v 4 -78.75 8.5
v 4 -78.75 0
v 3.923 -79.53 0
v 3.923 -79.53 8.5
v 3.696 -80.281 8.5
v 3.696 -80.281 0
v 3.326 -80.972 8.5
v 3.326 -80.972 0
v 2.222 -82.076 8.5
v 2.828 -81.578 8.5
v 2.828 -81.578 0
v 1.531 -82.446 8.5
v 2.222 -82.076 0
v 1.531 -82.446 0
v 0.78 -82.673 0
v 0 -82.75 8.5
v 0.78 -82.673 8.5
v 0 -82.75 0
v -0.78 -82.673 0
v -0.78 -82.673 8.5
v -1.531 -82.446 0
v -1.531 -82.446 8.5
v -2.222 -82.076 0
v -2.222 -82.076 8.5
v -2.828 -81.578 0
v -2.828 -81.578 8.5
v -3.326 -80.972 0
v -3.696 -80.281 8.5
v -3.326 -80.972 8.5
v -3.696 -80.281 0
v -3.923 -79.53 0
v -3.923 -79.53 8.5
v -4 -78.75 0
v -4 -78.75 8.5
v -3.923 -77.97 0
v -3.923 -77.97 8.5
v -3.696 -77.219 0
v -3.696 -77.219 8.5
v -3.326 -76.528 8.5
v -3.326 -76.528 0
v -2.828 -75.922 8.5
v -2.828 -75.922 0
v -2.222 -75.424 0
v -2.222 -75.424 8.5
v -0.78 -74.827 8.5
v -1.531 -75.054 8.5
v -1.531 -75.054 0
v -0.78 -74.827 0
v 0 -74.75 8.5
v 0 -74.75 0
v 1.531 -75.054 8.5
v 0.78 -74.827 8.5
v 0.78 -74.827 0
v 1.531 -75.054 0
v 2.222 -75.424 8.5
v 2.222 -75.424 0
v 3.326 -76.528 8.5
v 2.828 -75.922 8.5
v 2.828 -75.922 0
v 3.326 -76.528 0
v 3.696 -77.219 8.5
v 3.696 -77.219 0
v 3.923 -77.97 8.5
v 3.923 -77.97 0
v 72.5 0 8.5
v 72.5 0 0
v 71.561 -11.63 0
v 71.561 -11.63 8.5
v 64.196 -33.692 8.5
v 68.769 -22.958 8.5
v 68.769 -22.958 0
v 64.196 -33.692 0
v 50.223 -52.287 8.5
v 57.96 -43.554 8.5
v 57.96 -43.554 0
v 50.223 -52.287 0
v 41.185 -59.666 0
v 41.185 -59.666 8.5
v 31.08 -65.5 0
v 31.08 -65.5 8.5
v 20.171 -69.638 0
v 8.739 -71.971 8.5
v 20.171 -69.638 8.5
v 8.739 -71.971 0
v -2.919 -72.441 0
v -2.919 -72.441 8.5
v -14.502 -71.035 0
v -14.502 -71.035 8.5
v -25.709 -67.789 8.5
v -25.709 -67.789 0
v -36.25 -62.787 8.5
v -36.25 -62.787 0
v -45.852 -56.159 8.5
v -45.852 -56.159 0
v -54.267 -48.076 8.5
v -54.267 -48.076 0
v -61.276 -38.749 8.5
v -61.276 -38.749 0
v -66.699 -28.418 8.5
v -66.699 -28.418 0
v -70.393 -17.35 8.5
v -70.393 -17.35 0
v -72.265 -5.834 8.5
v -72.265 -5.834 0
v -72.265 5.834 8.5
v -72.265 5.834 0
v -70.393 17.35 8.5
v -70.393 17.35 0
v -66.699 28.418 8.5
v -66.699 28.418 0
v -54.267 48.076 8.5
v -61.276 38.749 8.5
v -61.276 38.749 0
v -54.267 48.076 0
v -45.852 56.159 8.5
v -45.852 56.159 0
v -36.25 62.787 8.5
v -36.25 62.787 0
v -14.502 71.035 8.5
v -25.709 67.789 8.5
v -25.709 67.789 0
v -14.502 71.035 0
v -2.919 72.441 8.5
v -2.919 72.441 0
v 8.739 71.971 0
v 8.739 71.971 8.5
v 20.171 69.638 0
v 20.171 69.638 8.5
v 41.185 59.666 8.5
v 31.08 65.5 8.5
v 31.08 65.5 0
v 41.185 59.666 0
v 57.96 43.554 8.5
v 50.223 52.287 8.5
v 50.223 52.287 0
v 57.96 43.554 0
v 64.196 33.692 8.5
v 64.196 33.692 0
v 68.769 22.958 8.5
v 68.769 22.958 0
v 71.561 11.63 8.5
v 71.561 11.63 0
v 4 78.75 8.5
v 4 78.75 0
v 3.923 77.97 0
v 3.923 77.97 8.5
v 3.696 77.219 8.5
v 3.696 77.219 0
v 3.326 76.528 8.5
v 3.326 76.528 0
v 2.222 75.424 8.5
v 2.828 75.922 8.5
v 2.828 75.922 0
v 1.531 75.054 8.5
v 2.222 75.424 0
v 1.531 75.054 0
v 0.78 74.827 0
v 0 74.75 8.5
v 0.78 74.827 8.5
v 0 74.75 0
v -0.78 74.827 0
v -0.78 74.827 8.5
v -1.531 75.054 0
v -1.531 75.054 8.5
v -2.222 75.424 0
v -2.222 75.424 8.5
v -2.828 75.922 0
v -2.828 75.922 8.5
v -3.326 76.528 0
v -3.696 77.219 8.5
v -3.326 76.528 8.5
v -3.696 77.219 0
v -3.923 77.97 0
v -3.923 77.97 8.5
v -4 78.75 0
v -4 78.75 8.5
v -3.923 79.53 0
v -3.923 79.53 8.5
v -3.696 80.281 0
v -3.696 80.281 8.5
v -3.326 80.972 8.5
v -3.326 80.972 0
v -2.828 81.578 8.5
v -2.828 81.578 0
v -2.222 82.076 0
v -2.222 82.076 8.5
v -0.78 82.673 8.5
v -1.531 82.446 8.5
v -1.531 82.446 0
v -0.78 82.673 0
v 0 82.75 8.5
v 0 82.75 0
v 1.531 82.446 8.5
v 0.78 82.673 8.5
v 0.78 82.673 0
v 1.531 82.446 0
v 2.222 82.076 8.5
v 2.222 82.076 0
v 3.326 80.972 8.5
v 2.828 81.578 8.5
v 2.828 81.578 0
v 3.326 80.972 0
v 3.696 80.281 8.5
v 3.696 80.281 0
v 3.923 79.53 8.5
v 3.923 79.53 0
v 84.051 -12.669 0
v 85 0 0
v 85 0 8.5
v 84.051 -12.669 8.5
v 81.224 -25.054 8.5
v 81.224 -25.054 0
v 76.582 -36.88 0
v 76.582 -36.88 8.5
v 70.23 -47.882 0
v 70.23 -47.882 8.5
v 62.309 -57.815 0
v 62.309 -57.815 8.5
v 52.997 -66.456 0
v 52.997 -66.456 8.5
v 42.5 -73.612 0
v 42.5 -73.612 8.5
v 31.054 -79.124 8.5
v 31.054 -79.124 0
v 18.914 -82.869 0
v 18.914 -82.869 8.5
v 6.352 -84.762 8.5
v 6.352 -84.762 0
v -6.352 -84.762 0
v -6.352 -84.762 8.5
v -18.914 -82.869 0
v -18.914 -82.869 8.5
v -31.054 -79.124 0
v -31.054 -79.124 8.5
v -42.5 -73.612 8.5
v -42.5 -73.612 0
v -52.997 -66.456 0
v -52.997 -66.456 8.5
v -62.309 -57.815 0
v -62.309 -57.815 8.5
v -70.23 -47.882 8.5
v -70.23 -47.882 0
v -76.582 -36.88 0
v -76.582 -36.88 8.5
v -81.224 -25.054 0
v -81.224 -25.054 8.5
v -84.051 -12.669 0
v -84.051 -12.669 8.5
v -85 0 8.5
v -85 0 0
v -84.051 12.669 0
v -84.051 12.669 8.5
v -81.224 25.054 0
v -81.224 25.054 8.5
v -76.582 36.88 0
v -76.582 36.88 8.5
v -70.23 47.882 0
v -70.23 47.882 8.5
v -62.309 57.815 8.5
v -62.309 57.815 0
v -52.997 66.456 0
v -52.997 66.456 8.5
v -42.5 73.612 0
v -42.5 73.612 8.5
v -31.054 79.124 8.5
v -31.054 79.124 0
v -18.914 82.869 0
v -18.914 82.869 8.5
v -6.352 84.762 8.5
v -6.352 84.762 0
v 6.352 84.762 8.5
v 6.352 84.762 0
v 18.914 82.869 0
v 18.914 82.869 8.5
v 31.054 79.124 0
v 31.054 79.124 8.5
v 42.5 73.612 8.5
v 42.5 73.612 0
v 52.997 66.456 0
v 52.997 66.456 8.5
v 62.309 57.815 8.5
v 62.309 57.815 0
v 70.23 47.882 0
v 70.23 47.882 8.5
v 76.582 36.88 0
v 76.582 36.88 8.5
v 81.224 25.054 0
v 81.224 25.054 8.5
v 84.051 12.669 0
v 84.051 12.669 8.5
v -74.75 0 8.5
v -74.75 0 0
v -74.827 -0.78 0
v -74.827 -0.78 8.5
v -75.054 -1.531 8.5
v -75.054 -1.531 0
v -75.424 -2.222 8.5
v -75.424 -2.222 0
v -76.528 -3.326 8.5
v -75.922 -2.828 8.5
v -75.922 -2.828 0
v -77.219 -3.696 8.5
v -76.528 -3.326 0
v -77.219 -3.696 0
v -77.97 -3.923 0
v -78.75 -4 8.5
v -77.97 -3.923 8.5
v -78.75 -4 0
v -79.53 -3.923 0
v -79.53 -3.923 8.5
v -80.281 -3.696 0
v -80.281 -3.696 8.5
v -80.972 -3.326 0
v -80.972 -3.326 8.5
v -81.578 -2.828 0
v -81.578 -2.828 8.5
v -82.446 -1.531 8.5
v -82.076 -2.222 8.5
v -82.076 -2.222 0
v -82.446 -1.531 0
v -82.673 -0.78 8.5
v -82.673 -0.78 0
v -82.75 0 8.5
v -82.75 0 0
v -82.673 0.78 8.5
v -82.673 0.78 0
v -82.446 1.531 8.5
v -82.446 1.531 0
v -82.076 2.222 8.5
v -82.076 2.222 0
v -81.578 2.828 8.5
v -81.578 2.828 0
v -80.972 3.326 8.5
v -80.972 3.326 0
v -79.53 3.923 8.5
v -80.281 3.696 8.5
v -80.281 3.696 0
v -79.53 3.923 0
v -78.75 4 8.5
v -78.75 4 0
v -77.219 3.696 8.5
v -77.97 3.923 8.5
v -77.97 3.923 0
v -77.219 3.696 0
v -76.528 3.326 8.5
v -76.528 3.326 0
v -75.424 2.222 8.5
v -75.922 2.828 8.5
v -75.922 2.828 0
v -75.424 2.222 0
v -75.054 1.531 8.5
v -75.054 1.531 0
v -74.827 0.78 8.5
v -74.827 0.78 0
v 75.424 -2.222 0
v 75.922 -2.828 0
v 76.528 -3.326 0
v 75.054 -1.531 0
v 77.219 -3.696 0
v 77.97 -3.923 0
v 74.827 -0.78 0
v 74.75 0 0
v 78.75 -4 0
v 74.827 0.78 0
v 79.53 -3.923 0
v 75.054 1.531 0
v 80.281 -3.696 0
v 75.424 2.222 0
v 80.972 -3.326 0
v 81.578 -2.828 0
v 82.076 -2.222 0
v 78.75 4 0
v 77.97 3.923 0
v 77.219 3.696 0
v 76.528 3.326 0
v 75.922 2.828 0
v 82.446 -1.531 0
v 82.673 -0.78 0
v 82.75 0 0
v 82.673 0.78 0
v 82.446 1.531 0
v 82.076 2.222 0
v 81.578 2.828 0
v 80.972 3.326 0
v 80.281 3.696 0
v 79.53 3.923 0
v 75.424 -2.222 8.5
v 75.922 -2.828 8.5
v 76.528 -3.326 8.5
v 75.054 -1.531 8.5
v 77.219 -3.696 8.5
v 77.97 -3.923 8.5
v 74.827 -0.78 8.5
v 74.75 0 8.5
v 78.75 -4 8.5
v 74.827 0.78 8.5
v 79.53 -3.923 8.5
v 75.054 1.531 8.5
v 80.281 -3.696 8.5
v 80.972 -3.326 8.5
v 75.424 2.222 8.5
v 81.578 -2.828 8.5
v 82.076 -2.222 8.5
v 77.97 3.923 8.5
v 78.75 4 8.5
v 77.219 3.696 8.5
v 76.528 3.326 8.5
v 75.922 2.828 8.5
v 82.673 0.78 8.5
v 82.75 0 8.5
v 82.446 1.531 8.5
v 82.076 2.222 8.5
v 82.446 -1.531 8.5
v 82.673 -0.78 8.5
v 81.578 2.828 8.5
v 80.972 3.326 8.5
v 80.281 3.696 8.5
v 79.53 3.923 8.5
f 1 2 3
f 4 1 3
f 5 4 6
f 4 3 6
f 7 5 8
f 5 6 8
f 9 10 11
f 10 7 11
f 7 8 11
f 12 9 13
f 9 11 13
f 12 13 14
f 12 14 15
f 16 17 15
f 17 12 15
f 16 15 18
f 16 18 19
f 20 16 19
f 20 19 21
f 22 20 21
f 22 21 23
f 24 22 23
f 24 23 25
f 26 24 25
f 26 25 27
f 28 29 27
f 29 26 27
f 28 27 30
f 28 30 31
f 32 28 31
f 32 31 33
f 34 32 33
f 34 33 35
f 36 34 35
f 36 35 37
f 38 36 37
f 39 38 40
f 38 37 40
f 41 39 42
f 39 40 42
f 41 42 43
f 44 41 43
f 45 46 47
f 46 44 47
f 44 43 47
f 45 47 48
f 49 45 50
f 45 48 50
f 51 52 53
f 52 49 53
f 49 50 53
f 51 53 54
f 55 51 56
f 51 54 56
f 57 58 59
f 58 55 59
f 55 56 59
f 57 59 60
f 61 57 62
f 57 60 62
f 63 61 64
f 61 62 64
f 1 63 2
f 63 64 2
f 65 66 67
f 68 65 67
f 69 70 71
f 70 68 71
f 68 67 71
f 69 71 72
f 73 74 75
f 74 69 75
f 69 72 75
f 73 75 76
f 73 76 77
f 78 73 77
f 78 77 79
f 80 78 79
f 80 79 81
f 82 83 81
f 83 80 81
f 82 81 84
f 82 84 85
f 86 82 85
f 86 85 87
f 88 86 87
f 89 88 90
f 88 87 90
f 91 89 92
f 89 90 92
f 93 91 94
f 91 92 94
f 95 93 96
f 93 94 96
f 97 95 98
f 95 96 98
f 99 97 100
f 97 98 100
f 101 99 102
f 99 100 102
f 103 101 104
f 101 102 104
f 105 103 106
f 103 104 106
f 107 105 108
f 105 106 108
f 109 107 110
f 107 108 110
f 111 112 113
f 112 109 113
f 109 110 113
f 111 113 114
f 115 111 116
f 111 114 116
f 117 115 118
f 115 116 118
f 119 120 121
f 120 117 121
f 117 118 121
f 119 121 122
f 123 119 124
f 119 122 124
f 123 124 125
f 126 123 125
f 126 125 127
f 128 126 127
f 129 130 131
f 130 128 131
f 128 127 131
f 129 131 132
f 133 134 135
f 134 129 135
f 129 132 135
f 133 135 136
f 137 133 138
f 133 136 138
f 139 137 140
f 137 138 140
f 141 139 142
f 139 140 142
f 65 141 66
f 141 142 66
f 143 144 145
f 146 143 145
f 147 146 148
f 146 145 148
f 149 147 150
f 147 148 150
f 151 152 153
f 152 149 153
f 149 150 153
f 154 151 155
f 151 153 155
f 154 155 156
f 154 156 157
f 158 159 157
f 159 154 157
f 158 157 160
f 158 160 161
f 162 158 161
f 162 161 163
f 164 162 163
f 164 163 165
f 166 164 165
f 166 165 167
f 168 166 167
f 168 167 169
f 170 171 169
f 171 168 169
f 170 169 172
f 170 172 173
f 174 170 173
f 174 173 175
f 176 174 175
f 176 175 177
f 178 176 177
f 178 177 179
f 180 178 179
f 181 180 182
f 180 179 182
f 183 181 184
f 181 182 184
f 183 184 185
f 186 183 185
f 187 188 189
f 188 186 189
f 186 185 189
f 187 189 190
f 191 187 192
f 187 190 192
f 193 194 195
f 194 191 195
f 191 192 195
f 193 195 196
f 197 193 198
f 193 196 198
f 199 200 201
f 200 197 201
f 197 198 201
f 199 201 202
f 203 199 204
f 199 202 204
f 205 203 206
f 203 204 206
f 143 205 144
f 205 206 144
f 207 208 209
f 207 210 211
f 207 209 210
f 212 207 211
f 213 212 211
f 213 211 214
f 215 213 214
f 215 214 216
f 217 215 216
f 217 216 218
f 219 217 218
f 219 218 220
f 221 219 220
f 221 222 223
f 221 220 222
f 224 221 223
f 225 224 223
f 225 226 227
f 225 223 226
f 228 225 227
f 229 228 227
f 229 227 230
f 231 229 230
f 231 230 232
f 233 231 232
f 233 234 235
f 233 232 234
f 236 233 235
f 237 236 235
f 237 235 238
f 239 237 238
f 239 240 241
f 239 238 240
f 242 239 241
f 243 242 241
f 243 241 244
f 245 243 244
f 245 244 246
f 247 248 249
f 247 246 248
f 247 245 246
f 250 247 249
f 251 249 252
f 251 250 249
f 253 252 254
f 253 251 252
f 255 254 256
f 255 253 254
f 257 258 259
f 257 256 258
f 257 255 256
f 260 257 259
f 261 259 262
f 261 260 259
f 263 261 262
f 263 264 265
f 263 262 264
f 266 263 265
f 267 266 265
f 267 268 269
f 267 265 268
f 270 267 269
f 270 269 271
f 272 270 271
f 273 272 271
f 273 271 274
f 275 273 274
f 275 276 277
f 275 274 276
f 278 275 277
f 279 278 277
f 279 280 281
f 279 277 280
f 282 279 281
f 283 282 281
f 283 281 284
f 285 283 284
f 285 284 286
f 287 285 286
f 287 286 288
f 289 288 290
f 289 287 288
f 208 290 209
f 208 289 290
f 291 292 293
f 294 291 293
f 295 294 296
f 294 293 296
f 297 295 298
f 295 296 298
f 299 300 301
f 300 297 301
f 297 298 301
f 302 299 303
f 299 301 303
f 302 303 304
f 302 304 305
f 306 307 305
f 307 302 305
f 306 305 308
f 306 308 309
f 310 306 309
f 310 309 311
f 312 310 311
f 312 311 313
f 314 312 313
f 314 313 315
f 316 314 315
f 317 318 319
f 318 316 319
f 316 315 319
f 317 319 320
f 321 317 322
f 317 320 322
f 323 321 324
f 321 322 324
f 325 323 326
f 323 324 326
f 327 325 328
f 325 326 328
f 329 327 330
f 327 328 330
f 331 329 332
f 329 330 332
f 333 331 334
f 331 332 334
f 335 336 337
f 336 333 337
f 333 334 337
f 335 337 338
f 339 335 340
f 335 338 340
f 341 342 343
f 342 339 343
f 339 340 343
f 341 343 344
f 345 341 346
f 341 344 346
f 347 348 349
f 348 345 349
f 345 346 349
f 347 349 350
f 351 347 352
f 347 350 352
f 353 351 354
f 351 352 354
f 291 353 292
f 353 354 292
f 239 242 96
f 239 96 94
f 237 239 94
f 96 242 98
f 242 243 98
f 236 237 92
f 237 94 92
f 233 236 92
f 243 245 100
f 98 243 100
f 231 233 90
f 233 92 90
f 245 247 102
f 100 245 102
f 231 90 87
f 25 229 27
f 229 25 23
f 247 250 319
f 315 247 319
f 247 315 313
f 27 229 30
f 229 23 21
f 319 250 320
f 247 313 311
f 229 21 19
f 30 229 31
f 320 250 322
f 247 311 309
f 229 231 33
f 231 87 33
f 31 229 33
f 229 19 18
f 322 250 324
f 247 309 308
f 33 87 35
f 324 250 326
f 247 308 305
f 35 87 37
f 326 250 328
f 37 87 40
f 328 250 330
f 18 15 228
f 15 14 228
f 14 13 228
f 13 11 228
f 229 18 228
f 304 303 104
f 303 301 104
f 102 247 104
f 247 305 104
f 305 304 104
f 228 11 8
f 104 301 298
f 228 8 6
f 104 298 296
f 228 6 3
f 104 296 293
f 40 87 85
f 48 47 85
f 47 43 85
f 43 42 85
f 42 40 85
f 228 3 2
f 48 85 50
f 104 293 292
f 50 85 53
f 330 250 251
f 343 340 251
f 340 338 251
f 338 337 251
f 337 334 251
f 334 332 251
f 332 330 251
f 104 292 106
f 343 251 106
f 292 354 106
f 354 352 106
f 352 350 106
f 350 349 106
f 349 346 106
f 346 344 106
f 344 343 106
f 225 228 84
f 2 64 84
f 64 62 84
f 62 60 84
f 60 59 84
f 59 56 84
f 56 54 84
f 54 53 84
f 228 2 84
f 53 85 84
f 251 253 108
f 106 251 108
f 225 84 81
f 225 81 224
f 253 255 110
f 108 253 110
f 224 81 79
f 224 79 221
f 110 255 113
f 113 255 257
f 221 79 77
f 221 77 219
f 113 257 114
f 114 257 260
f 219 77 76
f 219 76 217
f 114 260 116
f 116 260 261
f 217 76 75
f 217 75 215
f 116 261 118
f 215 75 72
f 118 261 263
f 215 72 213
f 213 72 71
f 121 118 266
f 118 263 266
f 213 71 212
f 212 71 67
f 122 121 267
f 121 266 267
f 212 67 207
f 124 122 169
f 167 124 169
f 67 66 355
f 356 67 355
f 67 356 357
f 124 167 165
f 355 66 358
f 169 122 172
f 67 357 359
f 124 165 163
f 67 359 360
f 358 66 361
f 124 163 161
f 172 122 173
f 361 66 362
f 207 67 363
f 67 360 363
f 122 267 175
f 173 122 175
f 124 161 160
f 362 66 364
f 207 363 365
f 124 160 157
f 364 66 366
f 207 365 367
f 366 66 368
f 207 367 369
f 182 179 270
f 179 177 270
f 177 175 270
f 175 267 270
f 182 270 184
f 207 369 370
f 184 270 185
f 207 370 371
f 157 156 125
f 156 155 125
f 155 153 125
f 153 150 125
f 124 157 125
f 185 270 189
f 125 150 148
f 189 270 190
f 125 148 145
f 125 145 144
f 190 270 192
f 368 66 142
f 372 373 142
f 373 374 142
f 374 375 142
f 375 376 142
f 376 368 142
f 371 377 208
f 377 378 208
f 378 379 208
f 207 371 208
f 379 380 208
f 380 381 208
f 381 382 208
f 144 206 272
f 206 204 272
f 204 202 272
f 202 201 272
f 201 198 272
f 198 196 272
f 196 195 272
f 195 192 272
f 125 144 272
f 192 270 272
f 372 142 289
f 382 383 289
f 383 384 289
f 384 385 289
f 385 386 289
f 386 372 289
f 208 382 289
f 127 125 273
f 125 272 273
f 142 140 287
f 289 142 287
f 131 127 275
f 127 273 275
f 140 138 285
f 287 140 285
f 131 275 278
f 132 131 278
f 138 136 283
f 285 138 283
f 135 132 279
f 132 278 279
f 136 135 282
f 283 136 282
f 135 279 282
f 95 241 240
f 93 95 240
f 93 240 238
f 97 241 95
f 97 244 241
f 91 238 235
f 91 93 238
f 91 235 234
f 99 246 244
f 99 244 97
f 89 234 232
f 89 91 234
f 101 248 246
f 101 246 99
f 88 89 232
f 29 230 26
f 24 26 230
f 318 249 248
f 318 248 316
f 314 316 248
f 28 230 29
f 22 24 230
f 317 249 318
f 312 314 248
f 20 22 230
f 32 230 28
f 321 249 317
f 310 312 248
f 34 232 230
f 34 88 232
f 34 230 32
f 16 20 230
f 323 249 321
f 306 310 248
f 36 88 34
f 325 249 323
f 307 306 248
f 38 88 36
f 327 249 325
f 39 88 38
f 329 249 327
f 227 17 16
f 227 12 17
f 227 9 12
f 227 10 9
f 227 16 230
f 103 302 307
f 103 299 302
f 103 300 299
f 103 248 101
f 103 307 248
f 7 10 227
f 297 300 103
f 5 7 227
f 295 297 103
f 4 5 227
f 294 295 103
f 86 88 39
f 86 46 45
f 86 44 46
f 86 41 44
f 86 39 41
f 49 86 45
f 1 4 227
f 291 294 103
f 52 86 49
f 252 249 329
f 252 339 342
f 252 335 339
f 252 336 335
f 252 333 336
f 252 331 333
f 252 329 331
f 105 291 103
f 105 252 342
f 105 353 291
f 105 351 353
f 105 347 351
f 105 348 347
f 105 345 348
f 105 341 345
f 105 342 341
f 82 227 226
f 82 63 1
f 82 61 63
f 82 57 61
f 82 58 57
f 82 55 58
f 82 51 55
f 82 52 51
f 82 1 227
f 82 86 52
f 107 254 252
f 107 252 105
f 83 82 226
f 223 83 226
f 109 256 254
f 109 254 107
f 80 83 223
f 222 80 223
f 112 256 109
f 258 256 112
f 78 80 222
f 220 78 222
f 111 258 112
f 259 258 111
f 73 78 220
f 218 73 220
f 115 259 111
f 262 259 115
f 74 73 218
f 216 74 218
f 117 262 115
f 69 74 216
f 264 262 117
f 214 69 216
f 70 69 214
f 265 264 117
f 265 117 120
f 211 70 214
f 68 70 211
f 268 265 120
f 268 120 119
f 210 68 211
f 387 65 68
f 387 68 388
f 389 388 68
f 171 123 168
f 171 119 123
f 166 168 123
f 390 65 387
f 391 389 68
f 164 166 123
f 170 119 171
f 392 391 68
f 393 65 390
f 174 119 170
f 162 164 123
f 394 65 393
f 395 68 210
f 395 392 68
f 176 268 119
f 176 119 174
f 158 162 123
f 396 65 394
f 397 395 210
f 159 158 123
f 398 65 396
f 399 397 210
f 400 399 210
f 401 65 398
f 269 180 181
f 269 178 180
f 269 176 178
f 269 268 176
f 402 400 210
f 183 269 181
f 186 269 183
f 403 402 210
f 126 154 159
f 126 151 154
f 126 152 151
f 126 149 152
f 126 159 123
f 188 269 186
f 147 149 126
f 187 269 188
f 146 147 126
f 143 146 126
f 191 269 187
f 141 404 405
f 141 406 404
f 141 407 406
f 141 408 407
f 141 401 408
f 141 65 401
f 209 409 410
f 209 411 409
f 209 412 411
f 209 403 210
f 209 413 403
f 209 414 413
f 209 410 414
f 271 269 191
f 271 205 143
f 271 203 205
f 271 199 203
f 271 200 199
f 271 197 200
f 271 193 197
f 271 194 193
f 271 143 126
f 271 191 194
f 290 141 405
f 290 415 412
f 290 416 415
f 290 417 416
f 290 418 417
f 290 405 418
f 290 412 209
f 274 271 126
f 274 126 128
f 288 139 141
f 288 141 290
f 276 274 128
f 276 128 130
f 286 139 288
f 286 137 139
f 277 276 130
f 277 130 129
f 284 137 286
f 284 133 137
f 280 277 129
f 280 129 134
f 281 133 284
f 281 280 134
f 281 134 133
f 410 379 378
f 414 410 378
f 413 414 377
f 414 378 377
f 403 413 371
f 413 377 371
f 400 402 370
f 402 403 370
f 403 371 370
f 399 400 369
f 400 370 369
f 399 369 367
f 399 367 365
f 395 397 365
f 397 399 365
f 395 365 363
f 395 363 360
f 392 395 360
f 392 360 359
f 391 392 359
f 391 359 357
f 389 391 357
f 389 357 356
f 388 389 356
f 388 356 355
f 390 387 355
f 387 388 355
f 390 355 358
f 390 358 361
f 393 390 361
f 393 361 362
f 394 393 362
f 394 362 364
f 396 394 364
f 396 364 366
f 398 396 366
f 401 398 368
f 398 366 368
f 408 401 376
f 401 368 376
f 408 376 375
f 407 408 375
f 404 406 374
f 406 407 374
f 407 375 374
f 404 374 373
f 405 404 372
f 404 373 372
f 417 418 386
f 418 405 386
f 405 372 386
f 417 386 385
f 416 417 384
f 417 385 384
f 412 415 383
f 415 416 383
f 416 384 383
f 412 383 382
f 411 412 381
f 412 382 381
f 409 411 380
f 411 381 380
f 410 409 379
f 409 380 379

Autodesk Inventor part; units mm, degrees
ref_plane "YZ Plane" through (0, 0, 0) normal (1, 0, 0) x (0, 1, 0)
ref_plane "XZ Plane" through (0, 0, 0) normal (0, 1, 0) x (-1, 0, 0)
ref_plane "XY Plane" through (0, 0, 0) normal (0, 0, 1) x (1, 0, 0)
sketch "スケッチ1" plane through (0, 0, 0) normal (0, 0, 1) x (1, 0, 0)
  circle A0 centre (0, 0) radius 72.5
  circle A1 centre (0, 0) radius 85
  circle A2 centre (0, 0) radius 78.75 construction
  circle A3 centre (0, 78.75) radius 4
  circle A4 centre (78.75, 0) radius 4
  circle A5 centre (0, -78.75) radius 4
  circle A6 centre (-78.75, 0) radius 4
  dimension "d0" = 145
  dimension "d1" = 170
  dimension "d14" = 157.5
  dimension "d15" = 8
  dimension "d16" = 8
  dimension "d17" = 8
  dimension "d18" = 8
extrude "押し出し2" add sketch "スケッチ1" along normal blind 8.5
properties part number "ベアリング 内側"
